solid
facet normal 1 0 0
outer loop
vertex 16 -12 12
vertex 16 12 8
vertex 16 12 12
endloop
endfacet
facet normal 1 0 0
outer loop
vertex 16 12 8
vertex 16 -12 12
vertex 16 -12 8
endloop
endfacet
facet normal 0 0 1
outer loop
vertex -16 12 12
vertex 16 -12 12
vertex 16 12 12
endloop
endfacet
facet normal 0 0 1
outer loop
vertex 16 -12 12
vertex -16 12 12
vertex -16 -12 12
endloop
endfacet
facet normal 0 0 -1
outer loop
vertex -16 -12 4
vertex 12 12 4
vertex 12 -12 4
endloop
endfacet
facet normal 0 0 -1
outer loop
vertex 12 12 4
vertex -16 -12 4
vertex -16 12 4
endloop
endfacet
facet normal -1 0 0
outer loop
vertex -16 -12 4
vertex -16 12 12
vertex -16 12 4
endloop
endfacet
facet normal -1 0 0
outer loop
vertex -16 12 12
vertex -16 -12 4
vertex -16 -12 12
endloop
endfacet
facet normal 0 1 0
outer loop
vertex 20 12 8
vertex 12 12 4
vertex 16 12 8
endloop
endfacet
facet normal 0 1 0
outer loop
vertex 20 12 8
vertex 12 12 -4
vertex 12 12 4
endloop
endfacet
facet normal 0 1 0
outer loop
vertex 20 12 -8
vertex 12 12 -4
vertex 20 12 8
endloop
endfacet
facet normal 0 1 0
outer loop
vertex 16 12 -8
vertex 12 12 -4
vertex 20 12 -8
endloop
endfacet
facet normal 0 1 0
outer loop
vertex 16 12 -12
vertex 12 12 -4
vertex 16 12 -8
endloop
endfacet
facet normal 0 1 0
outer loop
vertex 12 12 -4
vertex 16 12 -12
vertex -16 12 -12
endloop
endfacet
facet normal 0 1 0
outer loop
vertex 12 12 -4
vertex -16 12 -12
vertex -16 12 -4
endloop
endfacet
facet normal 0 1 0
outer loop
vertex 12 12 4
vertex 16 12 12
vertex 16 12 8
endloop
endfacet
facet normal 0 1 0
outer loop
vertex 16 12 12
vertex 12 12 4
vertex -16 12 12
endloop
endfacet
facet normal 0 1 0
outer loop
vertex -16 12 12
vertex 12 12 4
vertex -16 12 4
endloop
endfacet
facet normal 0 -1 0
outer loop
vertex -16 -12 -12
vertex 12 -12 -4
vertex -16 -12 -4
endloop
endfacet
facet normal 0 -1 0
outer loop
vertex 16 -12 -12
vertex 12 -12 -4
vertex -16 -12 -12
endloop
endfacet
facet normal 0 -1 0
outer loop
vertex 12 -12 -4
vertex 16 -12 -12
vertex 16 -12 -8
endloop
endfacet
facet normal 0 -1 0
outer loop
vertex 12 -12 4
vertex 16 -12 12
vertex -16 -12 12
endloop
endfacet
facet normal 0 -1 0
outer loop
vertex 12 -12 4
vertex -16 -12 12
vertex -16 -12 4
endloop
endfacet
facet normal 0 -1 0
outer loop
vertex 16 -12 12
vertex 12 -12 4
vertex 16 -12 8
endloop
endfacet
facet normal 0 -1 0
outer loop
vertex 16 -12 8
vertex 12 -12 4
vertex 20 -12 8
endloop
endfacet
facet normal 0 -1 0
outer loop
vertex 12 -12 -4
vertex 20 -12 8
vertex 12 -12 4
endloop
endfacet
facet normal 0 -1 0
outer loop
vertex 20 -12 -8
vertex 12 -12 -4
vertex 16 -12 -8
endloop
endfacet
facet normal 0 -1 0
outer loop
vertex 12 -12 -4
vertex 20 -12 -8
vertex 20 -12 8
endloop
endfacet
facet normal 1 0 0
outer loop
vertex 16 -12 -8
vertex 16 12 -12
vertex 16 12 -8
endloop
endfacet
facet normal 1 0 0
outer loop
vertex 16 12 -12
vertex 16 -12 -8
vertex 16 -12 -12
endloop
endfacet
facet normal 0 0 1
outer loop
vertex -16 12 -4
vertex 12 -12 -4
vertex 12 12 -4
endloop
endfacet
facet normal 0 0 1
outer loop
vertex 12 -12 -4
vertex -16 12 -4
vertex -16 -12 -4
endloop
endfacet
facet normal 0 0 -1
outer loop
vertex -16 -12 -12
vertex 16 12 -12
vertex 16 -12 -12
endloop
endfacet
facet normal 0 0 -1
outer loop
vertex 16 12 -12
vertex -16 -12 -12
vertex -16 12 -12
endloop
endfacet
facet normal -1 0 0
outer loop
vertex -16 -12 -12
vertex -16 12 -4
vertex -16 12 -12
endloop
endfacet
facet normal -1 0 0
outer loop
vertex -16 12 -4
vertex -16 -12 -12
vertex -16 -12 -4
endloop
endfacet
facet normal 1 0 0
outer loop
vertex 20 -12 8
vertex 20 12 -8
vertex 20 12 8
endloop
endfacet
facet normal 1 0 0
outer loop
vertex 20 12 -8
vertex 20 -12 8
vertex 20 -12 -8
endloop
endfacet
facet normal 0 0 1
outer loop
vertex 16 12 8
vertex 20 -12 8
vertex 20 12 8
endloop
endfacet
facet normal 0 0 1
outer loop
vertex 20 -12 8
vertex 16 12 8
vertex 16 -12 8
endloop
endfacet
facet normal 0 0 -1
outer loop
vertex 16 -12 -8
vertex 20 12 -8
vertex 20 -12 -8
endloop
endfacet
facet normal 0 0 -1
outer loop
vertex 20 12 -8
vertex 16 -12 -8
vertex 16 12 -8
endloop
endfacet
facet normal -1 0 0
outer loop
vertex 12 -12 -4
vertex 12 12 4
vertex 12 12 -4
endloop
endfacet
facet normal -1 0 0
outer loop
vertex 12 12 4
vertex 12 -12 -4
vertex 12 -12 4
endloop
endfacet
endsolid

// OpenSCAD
size = 32;//block=32 //item=8


module beltPiece() {

  translate([0, 0, size * 0.25]) {//top
    cube([size * 1, size * 0.75, size * 0.25], center = true);
  }
  ;//translate
  translate([0, 0, -size * 0.25]) {//bottom
    cube([size * 1, size * 0.75, size * 0.25], center = true);
  }
  ;//translate

  //translate([-size*0.5,0,0]){	//left
  //cube([size*0.25,size*0.75,size*0.5],center=true);
  //};	//translate

  translate([size * 0.5, 0, 0]) {//right
    cube([size * 0.25, size * 0.75, size * 0.5], center = true);
  }
  ;//translate

}
;


beltPiece();
